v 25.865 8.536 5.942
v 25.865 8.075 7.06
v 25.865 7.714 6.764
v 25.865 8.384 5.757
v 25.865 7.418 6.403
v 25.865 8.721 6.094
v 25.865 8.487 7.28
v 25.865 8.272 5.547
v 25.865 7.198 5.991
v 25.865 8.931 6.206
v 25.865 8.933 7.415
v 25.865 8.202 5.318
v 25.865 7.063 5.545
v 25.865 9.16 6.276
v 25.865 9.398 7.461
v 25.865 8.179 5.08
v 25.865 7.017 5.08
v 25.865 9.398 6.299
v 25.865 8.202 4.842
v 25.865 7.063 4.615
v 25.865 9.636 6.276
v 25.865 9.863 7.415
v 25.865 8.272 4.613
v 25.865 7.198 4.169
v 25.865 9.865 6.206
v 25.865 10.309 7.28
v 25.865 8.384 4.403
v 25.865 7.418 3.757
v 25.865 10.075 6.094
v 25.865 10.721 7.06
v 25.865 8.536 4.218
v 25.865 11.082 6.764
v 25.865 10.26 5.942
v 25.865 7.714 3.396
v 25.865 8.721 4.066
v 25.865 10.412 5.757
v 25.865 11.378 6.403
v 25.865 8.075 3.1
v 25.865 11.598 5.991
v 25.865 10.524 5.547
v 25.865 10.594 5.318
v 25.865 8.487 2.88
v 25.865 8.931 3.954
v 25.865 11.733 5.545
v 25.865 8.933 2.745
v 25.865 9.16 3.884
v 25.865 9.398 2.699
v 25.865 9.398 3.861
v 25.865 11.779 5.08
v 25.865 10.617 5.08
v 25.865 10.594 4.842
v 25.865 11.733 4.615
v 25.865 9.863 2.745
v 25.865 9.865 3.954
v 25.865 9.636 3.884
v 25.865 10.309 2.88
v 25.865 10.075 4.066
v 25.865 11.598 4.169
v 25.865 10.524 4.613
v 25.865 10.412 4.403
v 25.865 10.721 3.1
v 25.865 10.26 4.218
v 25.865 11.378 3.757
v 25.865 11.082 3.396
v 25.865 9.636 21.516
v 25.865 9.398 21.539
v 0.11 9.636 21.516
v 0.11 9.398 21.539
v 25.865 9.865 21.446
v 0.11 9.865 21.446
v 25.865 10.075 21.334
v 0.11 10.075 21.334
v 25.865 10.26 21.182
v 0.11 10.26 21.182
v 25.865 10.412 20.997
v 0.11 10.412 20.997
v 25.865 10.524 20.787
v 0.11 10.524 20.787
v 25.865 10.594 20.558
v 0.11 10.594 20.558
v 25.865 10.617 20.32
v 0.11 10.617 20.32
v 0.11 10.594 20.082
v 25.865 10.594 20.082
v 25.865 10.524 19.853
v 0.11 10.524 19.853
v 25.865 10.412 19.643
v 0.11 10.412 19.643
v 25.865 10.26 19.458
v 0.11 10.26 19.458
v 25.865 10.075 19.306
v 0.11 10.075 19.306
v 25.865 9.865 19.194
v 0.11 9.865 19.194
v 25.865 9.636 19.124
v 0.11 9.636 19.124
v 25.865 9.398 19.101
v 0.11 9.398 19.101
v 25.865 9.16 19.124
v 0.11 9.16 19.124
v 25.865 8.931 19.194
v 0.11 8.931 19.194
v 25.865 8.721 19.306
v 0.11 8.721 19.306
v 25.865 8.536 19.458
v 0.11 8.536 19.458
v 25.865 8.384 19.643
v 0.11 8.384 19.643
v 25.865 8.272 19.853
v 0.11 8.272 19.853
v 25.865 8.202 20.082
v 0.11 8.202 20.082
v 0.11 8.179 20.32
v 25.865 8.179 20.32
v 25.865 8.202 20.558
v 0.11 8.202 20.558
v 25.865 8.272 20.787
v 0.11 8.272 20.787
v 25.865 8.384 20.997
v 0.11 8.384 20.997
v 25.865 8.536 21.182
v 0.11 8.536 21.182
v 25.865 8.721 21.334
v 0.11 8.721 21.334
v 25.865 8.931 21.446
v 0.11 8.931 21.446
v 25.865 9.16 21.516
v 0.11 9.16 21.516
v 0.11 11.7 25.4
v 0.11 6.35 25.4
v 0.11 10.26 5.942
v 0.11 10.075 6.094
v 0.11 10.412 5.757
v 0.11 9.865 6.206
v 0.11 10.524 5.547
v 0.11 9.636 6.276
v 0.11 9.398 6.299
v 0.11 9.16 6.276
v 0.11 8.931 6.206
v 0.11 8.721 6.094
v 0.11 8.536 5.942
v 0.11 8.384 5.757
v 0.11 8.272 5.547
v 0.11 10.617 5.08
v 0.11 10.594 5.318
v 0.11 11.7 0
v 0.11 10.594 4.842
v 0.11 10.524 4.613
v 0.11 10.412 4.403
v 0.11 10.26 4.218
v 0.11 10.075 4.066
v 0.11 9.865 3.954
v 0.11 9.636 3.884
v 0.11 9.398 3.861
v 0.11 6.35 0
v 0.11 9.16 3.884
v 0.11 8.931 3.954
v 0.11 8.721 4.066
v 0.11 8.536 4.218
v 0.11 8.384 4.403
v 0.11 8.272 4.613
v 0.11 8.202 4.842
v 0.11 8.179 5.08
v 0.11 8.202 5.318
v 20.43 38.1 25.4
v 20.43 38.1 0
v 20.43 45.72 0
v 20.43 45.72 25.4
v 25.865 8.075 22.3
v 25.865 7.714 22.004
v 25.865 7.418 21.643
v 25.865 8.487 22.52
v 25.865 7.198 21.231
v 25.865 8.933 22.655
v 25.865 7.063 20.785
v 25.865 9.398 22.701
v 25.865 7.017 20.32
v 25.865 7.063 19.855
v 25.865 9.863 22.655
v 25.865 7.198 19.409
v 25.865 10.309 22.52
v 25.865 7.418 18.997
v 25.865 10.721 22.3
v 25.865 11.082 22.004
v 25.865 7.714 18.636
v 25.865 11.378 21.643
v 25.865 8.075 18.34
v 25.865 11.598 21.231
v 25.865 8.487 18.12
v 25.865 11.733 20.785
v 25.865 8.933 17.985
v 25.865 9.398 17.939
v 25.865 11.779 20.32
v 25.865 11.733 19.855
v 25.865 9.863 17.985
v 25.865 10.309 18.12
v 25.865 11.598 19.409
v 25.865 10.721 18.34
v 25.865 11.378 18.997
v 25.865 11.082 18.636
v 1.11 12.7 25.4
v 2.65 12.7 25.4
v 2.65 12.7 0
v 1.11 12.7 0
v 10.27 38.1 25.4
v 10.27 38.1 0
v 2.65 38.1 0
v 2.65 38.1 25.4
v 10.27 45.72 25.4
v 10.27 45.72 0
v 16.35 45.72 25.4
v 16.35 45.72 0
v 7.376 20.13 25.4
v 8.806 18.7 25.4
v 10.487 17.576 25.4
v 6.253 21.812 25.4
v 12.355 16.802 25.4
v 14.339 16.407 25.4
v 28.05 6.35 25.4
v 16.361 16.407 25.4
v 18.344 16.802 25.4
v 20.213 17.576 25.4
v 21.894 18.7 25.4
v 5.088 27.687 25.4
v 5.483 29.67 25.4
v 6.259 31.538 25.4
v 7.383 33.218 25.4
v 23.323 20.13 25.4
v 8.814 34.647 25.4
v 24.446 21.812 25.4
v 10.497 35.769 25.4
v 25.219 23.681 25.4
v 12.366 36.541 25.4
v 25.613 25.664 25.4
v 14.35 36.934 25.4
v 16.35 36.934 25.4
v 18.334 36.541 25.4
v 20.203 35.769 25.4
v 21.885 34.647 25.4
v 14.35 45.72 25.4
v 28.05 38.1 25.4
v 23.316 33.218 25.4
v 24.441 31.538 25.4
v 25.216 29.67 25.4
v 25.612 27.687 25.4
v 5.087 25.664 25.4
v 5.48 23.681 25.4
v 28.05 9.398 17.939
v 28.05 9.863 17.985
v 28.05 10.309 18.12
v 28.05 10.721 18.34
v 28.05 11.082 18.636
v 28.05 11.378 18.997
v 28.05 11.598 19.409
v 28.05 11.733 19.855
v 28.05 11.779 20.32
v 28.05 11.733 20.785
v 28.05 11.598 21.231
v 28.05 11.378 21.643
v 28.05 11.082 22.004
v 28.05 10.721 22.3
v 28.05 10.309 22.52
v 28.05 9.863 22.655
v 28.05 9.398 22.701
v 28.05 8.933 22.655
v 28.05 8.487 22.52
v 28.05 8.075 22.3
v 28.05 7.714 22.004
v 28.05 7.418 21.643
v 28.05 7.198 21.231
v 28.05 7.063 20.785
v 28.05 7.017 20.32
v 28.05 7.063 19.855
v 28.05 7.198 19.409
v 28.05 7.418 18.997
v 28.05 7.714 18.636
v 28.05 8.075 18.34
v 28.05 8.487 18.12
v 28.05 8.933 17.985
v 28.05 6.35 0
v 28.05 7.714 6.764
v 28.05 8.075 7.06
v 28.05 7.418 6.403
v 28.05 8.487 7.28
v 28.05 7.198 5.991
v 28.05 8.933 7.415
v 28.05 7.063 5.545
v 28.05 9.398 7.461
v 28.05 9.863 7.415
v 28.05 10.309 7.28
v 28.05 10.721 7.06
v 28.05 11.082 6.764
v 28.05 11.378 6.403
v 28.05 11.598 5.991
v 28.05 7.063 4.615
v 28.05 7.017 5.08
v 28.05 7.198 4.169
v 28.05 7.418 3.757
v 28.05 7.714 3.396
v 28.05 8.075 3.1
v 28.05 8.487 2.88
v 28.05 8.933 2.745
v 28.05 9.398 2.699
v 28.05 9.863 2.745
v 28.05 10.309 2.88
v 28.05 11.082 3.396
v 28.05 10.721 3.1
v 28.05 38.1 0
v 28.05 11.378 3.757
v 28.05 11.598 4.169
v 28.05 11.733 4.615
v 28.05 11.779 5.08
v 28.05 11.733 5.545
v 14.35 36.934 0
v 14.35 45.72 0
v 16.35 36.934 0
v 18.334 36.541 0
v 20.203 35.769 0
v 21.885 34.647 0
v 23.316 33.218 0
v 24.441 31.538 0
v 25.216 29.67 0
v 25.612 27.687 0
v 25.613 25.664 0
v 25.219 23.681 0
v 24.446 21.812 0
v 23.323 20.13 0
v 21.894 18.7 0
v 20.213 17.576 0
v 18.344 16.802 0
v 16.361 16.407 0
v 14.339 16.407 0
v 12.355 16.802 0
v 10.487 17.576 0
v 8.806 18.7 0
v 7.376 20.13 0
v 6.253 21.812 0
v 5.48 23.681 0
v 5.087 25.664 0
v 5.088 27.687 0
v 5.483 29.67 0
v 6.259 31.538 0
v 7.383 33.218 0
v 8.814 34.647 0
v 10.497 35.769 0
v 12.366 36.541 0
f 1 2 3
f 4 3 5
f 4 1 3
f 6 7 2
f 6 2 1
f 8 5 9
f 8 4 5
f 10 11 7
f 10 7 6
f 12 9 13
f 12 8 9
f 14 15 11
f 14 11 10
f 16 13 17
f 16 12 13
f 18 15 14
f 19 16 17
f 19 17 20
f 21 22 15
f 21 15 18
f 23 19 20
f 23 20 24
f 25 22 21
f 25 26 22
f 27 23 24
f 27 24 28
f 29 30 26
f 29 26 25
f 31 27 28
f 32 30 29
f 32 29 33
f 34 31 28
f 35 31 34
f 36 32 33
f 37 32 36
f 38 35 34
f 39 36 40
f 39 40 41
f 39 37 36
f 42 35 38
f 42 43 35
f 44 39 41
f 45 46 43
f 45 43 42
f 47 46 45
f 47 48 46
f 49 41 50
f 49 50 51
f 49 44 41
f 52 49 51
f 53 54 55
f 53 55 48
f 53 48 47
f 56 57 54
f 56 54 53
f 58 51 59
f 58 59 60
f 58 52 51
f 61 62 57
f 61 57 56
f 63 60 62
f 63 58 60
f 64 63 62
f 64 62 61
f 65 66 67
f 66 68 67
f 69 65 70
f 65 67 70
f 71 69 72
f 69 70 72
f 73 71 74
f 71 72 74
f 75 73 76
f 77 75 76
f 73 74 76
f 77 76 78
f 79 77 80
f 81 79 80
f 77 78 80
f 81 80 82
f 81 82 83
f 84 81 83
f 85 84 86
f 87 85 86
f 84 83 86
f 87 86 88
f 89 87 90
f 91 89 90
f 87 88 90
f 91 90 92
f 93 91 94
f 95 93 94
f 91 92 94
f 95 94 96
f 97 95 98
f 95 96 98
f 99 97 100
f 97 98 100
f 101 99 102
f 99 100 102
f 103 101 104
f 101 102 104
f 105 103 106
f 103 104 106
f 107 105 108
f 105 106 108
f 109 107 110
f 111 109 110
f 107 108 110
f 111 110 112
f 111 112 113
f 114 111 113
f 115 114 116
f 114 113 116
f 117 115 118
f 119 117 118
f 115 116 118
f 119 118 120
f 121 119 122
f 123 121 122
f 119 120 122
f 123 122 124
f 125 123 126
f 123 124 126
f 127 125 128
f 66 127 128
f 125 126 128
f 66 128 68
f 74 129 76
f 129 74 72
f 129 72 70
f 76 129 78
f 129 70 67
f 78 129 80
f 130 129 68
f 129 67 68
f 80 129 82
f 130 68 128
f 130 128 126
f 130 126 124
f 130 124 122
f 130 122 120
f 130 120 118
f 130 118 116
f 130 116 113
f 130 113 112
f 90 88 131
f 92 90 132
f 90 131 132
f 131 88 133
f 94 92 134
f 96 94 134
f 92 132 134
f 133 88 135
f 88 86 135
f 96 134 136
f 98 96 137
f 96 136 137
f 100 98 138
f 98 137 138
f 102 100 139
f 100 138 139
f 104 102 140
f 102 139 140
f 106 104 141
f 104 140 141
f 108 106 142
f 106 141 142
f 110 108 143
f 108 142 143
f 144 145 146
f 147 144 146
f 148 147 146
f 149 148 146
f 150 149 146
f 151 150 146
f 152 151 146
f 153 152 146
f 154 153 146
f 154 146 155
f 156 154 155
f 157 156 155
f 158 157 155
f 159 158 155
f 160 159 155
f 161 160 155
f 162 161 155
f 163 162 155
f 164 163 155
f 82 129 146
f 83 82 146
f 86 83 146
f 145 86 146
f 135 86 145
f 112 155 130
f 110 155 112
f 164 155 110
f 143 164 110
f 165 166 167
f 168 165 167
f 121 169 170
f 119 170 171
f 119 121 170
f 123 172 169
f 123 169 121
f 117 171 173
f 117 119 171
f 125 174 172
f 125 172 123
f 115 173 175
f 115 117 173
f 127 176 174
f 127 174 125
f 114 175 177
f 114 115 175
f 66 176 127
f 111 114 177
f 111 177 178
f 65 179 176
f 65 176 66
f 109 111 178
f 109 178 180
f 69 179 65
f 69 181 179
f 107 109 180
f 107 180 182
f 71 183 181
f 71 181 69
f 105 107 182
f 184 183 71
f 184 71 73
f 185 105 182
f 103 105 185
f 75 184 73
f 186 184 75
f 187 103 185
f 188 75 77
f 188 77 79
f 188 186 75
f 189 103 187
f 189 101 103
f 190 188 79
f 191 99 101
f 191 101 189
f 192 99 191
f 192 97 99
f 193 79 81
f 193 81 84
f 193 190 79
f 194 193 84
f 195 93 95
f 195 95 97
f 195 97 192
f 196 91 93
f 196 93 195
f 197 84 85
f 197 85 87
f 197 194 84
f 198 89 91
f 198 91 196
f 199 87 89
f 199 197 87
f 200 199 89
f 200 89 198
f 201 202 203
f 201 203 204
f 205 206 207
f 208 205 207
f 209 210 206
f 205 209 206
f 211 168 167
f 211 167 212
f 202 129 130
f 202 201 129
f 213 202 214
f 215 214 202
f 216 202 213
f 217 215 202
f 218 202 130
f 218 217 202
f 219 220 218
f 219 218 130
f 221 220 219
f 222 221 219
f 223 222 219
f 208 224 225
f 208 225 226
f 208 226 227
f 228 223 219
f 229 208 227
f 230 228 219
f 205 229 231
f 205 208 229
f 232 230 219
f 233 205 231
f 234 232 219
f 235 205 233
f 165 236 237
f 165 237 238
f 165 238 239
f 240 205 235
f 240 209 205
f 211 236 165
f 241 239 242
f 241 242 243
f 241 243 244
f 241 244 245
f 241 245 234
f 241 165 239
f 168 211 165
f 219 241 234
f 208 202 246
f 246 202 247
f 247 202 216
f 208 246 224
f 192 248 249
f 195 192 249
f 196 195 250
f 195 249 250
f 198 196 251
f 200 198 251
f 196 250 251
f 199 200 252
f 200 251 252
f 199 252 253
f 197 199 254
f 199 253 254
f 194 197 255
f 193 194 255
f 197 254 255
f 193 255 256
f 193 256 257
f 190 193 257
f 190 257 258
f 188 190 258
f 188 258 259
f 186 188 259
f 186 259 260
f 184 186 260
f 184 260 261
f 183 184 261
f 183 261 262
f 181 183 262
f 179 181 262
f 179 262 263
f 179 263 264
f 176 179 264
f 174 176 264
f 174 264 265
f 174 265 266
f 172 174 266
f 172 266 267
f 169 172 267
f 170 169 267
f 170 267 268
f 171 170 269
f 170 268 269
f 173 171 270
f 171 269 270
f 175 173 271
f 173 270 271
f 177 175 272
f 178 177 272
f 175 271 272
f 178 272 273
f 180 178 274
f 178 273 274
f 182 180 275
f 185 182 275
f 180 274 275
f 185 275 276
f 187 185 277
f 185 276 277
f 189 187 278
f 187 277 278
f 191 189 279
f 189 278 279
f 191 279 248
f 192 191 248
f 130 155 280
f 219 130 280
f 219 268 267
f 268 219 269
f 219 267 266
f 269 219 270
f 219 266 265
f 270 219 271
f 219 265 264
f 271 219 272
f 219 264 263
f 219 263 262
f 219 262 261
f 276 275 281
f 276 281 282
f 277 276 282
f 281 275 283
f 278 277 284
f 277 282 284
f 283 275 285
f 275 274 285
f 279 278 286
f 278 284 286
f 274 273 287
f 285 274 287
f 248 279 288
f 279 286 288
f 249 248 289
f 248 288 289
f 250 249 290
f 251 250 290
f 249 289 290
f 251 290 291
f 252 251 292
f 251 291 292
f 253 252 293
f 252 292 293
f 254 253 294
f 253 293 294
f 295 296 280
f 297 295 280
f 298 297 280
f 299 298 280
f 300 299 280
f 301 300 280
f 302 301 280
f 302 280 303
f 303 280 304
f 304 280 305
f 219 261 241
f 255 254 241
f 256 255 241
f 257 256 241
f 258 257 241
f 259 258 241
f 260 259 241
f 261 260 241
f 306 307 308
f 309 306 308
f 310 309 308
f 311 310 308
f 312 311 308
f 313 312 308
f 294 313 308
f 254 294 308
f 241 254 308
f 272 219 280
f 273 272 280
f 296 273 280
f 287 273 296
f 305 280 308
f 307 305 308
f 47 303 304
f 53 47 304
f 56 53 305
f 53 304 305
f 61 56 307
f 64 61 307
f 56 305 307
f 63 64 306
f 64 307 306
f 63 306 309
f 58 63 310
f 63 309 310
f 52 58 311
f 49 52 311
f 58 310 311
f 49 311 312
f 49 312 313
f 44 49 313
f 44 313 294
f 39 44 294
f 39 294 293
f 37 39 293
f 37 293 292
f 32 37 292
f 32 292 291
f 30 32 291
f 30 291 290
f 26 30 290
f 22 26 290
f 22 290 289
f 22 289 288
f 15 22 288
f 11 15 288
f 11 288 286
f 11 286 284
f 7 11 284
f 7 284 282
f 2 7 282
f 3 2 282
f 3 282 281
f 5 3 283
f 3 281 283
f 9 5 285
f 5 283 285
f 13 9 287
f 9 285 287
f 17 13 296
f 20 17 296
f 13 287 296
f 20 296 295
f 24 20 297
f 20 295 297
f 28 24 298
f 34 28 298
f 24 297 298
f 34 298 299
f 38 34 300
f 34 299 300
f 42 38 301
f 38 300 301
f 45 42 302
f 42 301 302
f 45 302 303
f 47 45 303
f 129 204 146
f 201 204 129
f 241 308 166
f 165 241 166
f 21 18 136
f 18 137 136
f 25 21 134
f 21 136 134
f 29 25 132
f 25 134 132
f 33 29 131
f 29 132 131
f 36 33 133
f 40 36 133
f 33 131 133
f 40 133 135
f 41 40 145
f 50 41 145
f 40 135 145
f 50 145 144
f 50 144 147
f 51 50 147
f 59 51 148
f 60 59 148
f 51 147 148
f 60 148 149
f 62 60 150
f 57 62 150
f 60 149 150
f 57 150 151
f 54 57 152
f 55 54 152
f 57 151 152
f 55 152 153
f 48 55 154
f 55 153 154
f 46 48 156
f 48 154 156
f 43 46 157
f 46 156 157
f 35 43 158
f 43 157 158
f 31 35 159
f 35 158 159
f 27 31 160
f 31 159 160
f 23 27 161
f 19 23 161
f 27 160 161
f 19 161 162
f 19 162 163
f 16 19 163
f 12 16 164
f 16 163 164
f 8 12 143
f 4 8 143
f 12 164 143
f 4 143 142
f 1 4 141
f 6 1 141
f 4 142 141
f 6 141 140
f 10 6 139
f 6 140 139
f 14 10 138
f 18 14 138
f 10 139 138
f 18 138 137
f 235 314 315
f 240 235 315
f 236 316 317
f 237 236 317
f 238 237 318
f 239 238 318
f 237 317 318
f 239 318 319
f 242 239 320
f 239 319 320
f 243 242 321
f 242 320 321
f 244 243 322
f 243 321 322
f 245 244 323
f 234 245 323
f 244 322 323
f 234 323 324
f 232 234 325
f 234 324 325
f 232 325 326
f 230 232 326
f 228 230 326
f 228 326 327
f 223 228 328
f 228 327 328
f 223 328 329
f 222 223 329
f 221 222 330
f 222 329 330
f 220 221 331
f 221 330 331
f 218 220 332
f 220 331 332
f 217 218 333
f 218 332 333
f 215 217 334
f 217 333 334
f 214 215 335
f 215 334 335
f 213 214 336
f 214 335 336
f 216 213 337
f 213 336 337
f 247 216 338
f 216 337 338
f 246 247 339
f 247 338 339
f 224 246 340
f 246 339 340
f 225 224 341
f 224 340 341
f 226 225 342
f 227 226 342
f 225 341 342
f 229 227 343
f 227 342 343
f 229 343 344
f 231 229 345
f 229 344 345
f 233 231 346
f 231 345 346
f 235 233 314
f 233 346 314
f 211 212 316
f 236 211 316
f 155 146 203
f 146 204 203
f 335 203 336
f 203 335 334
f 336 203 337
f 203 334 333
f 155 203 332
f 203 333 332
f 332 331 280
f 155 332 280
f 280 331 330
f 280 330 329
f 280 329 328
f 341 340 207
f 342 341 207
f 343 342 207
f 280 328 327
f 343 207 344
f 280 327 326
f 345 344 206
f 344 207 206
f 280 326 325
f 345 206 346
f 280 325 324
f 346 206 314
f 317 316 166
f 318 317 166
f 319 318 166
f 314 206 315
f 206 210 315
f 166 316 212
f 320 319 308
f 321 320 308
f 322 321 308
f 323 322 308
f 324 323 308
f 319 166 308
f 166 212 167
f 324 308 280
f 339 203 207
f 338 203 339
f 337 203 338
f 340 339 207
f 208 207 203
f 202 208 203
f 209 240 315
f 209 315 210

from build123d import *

# Parameters (mm, degrees)
BOSS_EXTRUDE1_DEPTH                            = 25.4
CHAMFER1_SIZE                                  = 1
CBORE_FOR_2_SOCKET_HEAD_CAP_SCREW1_D           = 2.4384
CBORE_FOR_2_SOCKET_HEAD_CAP_SCREW1_CBORE_D     = 4.7625
CBORE_FOR_2_SOCKET_HEAD_CAP_SCREW1_CBORE_DEPTH = 2.1844


with BuildPart() as part:
    # Sketch1 → Boss-Extrude1 (new body)
    with BuildSketch(Plane.XY):
        with BuildLine():
            Line((0.109825555, 12.7), (0.109825555, 6.35))
            Line((0.109825555, 6.35), (28.049825555, 6.35))
            Line((28.049825555, 6.35), (28.049825555, 38.1))
            Line((28.049825555, 38.1), (20.429825555, 38.1))
            Line((20.429825555, 38.1), (20.429825555, 45.72))
            Line((20.429825555, 45.72), (16.349825555, 45.72))
            Line((16.349825555, 45.72), (16.349825555, 36.933800162))
            ThreePointArc((16.349825555, 36.933800162), (15.349825555, 16.3576), (14.349825555, 36.933800162))
            Line((14.349825555, 36.933800162), (14.349825555, 45.72))
            Line((14.349825555, 45.72), (10.269825555, 45.72))
            Line((10.269825555, 45.72), (10.269825555, 38.1))
            Line((10.269825555, 38.1), (2.649825555, 38.1))
            Line((2.649825555, 38.1), (2.649825555, 12.7))
            Line((2.649825555, 12.7), (0.109825555, 12.7))
        make_face()
    extrude(amount=BOSS_EXTRUDE1_DEPTH)

    # Chamfer1
    chamfer1_edges = [part.edges().sort_by_distance(p)[0] for p in [
        (0.109825555, 12.7, 12.7),
    ]]
    chamfer(chamfer1_edges, length=CHAMFER1_SIZE)

    # CBORE for #2 Socket Head Cap Screw1 (through all)
    with Locations(Plane(origin=(28.049825555, 0, 0), x_dir=(0, 0, -1), z_dir=(1, 0, 0))):
        with Locations((-20.32, 9.398), (-5.08, 9.398)):
            CounterBoreHole(CBORE_FOR_2_SOCKET_HEAD_CAP_SCREW1_D / 2, CBORE_FOR_2_SOCKET_HEAD_CAP_SCREW1_CBORE_D / 2, CBORE_FOR_2_SOCKET_HEAD_CAP_SCREW1_CBORE_DEPTH)


solid = part.part
